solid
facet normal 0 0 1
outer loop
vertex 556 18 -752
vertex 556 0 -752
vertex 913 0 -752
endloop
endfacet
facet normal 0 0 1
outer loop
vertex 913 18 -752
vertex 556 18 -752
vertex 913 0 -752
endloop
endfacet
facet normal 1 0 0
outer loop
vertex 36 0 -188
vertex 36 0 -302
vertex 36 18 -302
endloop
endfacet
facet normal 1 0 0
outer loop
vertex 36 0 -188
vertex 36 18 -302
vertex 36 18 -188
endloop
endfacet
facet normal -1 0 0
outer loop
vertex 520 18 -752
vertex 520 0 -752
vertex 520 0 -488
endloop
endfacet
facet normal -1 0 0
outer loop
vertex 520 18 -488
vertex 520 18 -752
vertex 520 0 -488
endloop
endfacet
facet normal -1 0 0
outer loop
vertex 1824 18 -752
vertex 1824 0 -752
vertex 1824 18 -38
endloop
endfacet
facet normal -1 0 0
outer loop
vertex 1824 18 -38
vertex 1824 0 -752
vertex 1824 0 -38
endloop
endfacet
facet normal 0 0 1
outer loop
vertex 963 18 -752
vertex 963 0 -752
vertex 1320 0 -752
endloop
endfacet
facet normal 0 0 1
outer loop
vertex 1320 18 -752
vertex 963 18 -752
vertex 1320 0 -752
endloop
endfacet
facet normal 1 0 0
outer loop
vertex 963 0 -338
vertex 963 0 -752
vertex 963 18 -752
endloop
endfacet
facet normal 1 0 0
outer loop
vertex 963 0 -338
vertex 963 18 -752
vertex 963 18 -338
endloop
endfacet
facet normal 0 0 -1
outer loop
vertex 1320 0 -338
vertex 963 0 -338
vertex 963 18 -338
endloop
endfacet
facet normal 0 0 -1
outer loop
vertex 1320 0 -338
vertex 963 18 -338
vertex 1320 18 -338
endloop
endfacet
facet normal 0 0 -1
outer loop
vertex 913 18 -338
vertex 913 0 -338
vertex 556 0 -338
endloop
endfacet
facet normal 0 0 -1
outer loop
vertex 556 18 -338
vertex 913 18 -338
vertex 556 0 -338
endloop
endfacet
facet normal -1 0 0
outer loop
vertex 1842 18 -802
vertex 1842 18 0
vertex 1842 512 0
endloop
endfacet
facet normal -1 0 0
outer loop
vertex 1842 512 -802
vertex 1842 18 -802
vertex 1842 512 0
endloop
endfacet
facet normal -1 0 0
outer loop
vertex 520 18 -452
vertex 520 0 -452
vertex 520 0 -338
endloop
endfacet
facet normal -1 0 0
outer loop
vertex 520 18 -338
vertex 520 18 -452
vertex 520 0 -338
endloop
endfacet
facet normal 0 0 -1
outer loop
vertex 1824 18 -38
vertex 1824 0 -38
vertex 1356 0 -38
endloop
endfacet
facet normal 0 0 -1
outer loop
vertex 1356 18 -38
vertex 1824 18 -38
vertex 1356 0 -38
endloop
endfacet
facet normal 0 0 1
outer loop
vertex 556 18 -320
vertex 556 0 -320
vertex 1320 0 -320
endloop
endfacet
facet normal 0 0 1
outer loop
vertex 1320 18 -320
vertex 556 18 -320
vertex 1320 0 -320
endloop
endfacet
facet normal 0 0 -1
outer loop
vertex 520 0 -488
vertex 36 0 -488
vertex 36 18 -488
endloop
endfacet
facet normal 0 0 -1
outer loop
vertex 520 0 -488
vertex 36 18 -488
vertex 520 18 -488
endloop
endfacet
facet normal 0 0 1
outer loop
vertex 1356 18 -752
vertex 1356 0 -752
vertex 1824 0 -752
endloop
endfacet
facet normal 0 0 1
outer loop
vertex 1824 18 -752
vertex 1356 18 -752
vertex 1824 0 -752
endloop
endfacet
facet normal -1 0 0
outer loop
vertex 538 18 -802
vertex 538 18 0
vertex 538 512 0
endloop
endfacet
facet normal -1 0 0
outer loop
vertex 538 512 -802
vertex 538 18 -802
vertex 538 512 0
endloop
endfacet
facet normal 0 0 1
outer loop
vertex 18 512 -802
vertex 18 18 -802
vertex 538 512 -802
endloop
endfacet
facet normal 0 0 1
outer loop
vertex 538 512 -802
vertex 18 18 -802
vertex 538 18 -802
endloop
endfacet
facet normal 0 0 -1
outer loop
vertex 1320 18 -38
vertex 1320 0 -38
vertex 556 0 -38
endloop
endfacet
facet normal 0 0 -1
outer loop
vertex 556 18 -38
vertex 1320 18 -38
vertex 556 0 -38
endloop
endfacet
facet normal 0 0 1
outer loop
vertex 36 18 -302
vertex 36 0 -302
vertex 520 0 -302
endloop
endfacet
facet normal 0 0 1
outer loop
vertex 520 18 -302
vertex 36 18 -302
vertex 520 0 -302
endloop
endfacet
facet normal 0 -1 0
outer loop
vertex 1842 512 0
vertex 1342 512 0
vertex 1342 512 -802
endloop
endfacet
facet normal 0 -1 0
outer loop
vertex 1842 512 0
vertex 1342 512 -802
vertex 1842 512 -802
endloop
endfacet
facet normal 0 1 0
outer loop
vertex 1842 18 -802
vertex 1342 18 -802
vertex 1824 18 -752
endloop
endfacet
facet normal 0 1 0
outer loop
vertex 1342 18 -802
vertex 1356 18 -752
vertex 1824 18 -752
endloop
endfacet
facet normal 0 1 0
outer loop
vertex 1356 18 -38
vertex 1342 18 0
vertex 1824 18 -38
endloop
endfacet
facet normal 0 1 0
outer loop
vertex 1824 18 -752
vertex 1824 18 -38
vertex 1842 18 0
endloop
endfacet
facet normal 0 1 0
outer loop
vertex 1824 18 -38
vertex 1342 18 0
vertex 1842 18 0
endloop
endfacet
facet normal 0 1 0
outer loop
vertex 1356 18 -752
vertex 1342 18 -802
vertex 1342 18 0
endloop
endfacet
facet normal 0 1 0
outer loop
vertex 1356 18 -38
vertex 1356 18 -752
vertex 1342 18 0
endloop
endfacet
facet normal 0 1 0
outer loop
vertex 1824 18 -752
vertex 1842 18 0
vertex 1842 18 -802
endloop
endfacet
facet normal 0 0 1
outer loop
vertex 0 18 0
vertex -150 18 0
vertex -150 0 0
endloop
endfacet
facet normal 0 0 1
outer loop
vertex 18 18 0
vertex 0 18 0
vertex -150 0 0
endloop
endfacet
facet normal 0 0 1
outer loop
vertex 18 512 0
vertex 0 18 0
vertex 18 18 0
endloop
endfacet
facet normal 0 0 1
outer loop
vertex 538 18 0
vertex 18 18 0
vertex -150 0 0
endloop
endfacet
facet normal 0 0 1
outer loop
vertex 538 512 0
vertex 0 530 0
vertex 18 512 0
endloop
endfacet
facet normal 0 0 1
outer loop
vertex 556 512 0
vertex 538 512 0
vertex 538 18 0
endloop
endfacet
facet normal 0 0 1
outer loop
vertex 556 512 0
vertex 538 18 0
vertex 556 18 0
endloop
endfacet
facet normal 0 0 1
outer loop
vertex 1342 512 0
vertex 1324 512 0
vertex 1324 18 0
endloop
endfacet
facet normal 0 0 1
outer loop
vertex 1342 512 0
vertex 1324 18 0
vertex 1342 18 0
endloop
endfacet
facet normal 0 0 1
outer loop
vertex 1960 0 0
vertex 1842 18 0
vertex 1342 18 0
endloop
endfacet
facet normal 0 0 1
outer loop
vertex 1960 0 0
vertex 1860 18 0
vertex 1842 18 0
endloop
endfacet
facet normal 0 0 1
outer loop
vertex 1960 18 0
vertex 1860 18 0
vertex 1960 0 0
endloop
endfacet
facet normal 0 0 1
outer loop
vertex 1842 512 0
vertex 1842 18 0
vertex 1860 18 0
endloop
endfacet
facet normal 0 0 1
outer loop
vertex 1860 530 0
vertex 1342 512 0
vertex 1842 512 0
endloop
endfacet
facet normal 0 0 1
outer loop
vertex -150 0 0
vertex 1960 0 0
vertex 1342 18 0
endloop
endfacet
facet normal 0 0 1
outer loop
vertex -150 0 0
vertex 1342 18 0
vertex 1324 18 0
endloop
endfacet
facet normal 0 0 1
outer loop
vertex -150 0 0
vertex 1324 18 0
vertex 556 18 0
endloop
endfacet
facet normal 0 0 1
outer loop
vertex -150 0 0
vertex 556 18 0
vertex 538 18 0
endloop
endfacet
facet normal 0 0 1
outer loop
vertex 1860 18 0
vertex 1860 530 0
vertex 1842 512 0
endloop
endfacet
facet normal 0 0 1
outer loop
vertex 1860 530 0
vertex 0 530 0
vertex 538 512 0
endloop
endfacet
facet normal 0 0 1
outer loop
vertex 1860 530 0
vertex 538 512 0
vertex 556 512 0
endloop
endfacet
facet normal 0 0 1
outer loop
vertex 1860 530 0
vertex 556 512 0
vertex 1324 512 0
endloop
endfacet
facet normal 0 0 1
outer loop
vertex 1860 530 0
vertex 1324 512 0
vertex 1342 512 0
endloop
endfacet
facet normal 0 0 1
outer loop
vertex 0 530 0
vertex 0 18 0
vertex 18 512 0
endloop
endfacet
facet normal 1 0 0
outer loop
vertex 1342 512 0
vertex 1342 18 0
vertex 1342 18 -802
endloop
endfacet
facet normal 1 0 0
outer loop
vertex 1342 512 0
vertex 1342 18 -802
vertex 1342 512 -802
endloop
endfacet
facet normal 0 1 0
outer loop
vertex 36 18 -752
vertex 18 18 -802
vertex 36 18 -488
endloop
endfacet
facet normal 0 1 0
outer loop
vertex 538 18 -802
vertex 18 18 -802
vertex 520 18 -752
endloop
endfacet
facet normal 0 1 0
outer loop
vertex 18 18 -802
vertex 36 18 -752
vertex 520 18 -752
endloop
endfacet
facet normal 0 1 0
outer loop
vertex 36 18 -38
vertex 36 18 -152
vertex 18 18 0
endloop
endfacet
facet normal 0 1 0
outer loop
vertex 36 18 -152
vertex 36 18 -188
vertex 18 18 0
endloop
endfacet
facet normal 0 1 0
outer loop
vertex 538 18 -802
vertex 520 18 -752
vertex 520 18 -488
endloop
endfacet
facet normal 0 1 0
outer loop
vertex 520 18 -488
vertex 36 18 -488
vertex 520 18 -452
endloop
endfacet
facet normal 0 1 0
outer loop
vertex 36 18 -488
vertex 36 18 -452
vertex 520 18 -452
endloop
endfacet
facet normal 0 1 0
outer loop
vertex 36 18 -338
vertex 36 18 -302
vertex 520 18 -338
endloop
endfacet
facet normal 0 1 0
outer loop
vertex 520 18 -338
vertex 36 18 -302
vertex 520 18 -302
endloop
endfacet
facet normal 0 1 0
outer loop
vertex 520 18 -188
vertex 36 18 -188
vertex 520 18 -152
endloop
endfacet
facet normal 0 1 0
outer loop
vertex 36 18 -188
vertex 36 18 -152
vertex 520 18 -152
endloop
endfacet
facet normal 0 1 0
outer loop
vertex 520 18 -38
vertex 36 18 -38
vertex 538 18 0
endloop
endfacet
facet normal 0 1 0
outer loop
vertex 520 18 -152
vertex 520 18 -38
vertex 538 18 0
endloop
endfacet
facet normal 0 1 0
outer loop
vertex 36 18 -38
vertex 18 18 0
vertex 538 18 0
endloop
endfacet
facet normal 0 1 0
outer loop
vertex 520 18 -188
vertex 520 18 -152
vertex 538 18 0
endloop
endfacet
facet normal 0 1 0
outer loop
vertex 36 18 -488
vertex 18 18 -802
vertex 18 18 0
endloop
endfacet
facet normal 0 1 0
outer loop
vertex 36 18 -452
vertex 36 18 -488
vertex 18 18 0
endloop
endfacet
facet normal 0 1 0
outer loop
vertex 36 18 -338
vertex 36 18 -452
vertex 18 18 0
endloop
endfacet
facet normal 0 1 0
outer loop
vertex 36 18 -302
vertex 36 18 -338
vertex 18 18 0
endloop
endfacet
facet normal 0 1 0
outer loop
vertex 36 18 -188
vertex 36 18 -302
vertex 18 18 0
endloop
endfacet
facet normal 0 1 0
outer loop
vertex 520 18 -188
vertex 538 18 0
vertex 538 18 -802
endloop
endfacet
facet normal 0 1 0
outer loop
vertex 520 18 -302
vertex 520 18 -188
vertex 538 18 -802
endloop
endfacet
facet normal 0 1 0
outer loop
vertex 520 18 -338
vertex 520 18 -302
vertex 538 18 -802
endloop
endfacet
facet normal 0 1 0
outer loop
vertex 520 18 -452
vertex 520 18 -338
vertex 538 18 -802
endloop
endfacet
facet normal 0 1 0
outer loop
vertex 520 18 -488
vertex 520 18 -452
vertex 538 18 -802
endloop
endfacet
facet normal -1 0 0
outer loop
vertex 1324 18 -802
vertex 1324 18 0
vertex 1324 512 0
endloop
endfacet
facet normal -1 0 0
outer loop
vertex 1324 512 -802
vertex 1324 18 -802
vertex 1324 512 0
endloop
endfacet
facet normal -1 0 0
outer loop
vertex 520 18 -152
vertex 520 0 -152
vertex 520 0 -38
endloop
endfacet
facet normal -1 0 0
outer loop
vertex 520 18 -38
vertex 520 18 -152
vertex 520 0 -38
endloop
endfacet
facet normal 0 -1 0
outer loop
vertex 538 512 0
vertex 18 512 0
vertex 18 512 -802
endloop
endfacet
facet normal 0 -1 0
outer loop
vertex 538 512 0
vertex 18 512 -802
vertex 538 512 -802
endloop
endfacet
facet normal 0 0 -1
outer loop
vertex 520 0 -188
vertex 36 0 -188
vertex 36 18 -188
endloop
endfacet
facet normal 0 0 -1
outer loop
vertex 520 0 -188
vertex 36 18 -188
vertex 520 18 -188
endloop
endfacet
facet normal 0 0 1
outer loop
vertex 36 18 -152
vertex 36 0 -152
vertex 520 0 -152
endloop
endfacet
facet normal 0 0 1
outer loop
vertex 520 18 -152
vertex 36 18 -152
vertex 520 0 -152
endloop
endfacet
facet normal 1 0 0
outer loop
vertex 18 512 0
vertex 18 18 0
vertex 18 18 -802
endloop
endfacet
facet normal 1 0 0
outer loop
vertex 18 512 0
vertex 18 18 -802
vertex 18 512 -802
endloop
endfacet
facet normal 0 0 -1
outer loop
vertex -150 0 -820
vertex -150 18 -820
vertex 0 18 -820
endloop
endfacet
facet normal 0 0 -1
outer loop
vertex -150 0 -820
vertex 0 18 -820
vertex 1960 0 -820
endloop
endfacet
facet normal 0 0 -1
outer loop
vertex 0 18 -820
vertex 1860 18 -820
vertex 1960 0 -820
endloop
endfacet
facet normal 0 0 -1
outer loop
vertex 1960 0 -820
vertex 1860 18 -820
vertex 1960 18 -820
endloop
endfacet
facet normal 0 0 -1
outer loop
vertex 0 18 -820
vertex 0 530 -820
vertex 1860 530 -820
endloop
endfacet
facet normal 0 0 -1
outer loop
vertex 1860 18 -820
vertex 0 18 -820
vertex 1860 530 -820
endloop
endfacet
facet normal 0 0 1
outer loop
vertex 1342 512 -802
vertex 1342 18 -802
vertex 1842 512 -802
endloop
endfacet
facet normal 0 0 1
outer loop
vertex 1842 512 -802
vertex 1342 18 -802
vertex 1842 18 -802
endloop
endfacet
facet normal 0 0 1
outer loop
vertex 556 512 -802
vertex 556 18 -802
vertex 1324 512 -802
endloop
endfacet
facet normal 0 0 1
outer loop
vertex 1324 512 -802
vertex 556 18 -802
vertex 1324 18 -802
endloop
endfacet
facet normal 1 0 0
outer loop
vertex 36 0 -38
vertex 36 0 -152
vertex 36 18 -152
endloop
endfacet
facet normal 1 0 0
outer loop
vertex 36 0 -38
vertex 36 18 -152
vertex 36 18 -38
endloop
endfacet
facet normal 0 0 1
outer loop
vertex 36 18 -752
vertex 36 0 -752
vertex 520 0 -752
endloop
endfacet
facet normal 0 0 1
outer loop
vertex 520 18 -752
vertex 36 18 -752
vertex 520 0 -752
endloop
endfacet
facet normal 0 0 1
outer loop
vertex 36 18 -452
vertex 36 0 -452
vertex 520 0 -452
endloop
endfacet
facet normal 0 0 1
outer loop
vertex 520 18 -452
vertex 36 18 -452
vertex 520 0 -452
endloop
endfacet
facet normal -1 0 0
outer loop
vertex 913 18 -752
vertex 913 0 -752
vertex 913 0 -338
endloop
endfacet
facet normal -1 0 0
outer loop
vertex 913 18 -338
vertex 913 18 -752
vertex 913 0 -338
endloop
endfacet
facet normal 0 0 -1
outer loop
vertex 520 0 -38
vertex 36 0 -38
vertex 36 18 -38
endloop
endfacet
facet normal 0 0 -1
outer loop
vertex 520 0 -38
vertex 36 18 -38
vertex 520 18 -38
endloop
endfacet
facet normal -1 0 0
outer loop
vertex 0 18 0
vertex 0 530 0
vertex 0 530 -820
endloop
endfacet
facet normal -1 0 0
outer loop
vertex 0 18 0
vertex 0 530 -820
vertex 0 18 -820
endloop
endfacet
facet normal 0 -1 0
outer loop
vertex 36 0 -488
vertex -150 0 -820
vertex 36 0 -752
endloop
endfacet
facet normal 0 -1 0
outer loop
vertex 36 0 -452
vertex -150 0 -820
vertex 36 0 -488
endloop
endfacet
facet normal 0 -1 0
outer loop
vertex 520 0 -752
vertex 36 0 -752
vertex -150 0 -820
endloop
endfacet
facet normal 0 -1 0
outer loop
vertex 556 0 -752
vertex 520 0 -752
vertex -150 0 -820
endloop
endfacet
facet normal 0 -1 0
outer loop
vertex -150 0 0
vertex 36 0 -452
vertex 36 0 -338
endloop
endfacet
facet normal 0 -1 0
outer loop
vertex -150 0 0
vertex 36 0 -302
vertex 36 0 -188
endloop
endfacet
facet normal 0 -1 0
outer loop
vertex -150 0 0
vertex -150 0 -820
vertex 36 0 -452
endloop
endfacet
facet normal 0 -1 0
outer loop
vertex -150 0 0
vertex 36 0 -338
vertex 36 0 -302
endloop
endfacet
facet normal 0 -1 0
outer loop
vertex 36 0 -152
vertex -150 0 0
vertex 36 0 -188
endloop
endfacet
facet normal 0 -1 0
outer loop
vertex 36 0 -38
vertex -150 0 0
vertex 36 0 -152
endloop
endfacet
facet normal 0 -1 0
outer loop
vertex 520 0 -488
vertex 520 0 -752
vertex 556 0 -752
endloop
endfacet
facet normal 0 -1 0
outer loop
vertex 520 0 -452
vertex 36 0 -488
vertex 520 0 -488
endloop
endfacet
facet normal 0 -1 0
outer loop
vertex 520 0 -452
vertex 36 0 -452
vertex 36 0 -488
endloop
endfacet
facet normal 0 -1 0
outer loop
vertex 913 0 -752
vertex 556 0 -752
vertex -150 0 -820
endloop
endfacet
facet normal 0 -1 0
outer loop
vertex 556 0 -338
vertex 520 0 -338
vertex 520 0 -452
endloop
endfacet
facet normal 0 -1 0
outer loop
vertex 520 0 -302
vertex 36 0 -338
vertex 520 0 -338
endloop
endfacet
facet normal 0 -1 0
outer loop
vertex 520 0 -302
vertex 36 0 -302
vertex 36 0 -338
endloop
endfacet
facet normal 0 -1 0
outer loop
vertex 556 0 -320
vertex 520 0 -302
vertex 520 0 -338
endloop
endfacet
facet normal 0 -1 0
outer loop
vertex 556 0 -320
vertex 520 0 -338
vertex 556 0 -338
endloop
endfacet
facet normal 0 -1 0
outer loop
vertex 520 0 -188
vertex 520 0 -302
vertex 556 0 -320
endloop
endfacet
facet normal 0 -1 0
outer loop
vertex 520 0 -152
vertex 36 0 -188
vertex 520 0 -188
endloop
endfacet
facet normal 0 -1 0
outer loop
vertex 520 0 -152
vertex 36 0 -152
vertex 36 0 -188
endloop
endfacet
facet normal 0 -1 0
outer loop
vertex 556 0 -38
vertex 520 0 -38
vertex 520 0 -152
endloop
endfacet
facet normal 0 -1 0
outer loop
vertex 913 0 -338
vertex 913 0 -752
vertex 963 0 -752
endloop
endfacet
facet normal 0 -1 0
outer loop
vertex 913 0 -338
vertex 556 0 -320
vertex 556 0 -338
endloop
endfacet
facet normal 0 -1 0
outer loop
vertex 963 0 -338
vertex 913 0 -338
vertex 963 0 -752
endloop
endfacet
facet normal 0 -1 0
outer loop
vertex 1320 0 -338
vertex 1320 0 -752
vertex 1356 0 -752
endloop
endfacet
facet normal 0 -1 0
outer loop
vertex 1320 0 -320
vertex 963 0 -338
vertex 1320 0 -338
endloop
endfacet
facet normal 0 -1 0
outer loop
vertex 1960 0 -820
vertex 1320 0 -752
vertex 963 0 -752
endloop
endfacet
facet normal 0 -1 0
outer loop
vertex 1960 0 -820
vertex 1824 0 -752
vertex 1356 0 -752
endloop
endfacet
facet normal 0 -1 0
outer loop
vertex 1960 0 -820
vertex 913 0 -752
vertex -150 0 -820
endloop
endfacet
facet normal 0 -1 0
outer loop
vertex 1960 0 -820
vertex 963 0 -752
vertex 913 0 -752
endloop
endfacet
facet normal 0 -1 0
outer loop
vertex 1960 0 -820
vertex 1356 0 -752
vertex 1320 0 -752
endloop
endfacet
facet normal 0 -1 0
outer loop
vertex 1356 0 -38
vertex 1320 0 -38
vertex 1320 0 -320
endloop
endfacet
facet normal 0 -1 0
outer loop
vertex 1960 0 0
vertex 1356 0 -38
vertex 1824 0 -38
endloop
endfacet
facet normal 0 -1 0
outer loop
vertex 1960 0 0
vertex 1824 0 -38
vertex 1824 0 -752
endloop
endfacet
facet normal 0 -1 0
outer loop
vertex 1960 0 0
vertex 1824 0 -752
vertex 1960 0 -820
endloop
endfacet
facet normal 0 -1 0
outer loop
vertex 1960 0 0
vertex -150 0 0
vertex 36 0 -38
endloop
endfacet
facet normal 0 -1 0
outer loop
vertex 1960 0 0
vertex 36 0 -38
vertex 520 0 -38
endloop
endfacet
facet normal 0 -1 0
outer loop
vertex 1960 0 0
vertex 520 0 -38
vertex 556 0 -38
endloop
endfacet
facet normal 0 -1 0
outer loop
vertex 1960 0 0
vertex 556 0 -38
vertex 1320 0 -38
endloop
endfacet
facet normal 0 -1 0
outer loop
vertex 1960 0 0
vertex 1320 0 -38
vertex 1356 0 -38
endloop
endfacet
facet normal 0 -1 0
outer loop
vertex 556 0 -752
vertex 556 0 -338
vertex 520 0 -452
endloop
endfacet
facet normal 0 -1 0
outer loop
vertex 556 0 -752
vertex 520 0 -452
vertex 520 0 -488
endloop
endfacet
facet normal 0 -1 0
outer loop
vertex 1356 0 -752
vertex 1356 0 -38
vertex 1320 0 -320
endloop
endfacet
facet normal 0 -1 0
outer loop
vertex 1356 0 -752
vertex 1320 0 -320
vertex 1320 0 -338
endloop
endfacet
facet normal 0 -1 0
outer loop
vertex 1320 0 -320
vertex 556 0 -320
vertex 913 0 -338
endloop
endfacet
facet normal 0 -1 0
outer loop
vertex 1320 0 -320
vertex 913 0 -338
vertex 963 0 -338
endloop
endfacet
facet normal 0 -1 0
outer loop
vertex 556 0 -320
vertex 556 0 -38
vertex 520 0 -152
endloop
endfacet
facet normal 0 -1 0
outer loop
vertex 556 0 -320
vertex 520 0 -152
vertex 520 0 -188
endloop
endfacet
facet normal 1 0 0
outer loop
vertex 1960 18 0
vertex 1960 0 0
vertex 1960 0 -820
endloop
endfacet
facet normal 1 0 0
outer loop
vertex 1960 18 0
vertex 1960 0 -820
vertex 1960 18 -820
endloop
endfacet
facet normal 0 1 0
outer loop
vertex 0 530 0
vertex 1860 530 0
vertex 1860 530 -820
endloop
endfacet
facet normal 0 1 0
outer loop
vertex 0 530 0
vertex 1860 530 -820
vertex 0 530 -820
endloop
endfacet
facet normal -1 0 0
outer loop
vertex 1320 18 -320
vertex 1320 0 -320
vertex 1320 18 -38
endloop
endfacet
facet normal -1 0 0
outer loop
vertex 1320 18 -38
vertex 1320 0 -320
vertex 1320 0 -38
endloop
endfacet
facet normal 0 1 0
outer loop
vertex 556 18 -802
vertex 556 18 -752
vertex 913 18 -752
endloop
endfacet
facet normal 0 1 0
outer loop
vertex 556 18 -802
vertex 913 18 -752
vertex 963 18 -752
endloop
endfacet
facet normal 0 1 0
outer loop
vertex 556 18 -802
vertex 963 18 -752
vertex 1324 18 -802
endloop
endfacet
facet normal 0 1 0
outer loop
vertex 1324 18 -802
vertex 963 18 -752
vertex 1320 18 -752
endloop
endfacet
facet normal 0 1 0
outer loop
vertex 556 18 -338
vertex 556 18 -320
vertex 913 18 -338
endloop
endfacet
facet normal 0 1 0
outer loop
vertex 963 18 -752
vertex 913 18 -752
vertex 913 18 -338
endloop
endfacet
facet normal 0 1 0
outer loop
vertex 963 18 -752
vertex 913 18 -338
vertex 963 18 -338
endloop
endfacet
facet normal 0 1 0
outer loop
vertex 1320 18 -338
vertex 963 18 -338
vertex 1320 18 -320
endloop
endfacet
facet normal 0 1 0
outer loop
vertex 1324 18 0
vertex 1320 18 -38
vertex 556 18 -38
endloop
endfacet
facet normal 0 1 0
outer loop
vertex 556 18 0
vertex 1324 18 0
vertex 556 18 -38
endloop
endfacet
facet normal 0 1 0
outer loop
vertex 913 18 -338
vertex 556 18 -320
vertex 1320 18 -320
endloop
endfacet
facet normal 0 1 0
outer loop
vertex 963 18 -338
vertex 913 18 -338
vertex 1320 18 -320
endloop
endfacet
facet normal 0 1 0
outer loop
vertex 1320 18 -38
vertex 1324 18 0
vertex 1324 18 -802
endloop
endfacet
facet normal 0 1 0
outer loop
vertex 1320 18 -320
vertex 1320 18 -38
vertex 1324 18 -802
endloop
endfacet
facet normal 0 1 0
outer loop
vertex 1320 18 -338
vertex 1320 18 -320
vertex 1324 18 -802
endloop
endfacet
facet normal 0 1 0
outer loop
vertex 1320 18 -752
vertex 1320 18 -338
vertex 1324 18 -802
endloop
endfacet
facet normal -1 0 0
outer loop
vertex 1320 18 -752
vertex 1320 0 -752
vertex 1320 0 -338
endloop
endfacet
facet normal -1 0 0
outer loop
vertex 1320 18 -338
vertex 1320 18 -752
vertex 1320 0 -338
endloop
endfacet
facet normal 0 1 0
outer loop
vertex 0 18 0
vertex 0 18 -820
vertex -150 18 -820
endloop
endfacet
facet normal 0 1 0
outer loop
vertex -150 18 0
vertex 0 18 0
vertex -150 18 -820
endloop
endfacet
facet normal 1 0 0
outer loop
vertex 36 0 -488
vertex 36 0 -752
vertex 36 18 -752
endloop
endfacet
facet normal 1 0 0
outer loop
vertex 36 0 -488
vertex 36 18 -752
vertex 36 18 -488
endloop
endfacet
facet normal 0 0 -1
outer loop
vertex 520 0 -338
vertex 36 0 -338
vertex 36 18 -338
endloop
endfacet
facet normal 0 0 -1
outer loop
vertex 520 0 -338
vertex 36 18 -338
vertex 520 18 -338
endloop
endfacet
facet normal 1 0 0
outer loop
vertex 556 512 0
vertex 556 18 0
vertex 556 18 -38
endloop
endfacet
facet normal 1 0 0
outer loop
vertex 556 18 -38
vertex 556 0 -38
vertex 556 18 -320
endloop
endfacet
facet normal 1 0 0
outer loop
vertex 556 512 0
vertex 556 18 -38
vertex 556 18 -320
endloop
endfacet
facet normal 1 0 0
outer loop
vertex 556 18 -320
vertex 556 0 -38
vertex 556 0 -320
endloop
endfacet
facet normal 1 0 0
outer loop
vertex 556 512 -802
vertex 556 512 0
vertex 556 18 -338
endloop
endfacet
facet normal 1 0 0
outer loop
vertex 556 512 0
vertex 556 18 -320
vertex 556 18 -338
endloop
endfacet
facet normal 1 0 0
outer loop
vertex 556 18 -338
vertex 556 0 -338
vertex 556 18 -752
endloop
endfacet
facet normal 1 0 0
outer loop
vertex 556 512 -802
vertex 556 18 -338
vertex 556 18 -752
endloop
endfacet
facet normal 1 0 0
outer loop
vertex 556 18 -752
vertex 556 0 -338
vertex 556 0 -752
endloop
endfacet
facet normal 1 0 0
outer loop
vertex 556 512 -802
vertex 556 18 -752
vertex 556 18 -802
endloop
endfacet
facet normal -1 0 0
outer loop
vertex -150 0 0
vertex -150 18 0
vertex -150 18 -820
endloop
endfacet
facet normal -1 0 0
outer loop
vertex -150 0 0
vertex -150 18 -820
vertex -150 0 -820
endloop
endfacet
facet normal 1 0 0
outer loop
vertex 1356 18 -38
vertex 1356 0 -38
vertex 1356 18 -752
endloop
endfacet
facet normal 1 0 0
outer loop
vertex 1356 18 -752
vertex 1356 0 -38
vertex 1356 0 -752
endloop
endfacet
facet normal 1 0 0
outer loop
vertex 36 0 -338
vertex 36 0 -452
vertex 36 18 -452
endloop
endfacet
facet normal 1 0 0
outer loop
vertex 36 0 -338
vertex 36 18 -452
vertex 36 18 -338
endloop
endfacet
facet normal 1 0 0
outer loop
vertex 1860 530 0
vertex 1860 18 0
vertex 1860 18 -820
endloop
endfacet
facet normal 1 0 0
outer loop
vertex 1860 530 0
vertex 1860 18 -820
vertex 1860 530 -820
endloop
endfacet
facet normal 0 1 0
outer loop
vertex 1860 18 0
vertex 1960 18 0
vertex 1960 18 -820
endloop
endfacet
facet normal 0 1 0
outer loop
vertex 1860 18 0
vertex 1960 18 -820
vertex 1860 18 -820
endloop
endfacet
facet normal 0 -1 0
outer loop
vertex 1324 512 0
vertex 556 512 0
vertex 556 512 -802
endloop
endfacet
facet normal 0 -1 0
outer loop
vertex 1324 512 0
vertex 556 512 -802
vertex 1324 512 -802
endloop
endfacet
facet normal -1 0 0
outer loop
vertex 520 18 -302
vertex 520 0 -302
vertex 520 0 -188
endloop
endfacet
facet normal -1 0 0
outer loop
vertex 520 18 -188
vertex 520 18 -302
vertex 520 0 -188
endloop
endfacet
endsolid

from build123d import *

# Parameters (mm, degrees)
F0_W     = 520
F0_H     = 494
F0_W_2   = 768
F0_W_3   = 500
F1_DEPTH = 820
F2_W     = 484
F2_H     = 114
F2_H_2   = 264
F2_W_2   = 357
F2_H_3   = 414
F3_DEPTH = 50
F4_W     = 1835.1259900331
F4_H     = 504.2004961409
F5_DEPTH = 18


# Not quite as in the source:
# - a feature names something its author has since deleted; it is built from what else it names


with BuildPart() as f1:
    # F0 (on Top) → F1 (new body)
    with BuildSketch(Plane.XY):
        Polygon((-150, 0), (0, 0), (1860, 0), (1960, 0), (1960, 18), (1860, 18), (1860, 530), (0, 530), (0, 18), (-150, 18), align=None)
        with Locations((278, 265)):
            Rectangle(F0_W, F0_H, mode=Mode.SUBTRACT)
        with Locations((940, 265)):
            Rectangle(F0_W_2, F0_H, mode=Mode.SUBTRACT)
        with Locations((1592, 265)):
            Rectangle(F0_W_3, F0_H, mode=Mode.SUBTRACT)
    extrude(amount=-F1_DEPTH)

    # F2 (on face) → F3 (cut)
    with BuildSketch(Plane.XZ):
        with Locations((278, -95)):
            Rectangle(F2_W, F2_H)
        with Locations((278, -245)):
            Rectangle(F2_W, F2_H)
        with Locations((278, -395)):
            Rectangle(F2_W, F2_H)
        with Locations((278, -620)):
            Rectangle(F2_W, F2_H_2)
        Polygon((556, -257.2889821529), (556, -320), (1320, -320), (1320, -38), (913, -38), (556, -38), align=None)
        with Locations((1141.5, -545)):
            Rectangle(F2_W_2, F2_H_3)
        Polygon((1572, -38), (1356, -38), (1356, -752), (1572, -752), (1608, -752), (1824, -752), (1824, -38), (1608, -38), align=None)
        Polygon((913, -338), (556, -338), (556, -407.2889821529), (556, -557.2889821529), (556, -752), (913, -752), align=None)
    extrude(amount=-F3_DEPTH, mode=Mode.SUBTRACT)

    # F4 (on face) → F5 (join)
    with BuildSketch(Plane(origin=(0, 0, -820), x_dir=(1, 0, 0), z_dir=(0, 0, -1))):
        with Locations((924.4370049834, -259.8997519296)):
            Rectangle(F4_W, F4_H)
    extrude(amount=-F5_DEPTH)


solid = f1.part
